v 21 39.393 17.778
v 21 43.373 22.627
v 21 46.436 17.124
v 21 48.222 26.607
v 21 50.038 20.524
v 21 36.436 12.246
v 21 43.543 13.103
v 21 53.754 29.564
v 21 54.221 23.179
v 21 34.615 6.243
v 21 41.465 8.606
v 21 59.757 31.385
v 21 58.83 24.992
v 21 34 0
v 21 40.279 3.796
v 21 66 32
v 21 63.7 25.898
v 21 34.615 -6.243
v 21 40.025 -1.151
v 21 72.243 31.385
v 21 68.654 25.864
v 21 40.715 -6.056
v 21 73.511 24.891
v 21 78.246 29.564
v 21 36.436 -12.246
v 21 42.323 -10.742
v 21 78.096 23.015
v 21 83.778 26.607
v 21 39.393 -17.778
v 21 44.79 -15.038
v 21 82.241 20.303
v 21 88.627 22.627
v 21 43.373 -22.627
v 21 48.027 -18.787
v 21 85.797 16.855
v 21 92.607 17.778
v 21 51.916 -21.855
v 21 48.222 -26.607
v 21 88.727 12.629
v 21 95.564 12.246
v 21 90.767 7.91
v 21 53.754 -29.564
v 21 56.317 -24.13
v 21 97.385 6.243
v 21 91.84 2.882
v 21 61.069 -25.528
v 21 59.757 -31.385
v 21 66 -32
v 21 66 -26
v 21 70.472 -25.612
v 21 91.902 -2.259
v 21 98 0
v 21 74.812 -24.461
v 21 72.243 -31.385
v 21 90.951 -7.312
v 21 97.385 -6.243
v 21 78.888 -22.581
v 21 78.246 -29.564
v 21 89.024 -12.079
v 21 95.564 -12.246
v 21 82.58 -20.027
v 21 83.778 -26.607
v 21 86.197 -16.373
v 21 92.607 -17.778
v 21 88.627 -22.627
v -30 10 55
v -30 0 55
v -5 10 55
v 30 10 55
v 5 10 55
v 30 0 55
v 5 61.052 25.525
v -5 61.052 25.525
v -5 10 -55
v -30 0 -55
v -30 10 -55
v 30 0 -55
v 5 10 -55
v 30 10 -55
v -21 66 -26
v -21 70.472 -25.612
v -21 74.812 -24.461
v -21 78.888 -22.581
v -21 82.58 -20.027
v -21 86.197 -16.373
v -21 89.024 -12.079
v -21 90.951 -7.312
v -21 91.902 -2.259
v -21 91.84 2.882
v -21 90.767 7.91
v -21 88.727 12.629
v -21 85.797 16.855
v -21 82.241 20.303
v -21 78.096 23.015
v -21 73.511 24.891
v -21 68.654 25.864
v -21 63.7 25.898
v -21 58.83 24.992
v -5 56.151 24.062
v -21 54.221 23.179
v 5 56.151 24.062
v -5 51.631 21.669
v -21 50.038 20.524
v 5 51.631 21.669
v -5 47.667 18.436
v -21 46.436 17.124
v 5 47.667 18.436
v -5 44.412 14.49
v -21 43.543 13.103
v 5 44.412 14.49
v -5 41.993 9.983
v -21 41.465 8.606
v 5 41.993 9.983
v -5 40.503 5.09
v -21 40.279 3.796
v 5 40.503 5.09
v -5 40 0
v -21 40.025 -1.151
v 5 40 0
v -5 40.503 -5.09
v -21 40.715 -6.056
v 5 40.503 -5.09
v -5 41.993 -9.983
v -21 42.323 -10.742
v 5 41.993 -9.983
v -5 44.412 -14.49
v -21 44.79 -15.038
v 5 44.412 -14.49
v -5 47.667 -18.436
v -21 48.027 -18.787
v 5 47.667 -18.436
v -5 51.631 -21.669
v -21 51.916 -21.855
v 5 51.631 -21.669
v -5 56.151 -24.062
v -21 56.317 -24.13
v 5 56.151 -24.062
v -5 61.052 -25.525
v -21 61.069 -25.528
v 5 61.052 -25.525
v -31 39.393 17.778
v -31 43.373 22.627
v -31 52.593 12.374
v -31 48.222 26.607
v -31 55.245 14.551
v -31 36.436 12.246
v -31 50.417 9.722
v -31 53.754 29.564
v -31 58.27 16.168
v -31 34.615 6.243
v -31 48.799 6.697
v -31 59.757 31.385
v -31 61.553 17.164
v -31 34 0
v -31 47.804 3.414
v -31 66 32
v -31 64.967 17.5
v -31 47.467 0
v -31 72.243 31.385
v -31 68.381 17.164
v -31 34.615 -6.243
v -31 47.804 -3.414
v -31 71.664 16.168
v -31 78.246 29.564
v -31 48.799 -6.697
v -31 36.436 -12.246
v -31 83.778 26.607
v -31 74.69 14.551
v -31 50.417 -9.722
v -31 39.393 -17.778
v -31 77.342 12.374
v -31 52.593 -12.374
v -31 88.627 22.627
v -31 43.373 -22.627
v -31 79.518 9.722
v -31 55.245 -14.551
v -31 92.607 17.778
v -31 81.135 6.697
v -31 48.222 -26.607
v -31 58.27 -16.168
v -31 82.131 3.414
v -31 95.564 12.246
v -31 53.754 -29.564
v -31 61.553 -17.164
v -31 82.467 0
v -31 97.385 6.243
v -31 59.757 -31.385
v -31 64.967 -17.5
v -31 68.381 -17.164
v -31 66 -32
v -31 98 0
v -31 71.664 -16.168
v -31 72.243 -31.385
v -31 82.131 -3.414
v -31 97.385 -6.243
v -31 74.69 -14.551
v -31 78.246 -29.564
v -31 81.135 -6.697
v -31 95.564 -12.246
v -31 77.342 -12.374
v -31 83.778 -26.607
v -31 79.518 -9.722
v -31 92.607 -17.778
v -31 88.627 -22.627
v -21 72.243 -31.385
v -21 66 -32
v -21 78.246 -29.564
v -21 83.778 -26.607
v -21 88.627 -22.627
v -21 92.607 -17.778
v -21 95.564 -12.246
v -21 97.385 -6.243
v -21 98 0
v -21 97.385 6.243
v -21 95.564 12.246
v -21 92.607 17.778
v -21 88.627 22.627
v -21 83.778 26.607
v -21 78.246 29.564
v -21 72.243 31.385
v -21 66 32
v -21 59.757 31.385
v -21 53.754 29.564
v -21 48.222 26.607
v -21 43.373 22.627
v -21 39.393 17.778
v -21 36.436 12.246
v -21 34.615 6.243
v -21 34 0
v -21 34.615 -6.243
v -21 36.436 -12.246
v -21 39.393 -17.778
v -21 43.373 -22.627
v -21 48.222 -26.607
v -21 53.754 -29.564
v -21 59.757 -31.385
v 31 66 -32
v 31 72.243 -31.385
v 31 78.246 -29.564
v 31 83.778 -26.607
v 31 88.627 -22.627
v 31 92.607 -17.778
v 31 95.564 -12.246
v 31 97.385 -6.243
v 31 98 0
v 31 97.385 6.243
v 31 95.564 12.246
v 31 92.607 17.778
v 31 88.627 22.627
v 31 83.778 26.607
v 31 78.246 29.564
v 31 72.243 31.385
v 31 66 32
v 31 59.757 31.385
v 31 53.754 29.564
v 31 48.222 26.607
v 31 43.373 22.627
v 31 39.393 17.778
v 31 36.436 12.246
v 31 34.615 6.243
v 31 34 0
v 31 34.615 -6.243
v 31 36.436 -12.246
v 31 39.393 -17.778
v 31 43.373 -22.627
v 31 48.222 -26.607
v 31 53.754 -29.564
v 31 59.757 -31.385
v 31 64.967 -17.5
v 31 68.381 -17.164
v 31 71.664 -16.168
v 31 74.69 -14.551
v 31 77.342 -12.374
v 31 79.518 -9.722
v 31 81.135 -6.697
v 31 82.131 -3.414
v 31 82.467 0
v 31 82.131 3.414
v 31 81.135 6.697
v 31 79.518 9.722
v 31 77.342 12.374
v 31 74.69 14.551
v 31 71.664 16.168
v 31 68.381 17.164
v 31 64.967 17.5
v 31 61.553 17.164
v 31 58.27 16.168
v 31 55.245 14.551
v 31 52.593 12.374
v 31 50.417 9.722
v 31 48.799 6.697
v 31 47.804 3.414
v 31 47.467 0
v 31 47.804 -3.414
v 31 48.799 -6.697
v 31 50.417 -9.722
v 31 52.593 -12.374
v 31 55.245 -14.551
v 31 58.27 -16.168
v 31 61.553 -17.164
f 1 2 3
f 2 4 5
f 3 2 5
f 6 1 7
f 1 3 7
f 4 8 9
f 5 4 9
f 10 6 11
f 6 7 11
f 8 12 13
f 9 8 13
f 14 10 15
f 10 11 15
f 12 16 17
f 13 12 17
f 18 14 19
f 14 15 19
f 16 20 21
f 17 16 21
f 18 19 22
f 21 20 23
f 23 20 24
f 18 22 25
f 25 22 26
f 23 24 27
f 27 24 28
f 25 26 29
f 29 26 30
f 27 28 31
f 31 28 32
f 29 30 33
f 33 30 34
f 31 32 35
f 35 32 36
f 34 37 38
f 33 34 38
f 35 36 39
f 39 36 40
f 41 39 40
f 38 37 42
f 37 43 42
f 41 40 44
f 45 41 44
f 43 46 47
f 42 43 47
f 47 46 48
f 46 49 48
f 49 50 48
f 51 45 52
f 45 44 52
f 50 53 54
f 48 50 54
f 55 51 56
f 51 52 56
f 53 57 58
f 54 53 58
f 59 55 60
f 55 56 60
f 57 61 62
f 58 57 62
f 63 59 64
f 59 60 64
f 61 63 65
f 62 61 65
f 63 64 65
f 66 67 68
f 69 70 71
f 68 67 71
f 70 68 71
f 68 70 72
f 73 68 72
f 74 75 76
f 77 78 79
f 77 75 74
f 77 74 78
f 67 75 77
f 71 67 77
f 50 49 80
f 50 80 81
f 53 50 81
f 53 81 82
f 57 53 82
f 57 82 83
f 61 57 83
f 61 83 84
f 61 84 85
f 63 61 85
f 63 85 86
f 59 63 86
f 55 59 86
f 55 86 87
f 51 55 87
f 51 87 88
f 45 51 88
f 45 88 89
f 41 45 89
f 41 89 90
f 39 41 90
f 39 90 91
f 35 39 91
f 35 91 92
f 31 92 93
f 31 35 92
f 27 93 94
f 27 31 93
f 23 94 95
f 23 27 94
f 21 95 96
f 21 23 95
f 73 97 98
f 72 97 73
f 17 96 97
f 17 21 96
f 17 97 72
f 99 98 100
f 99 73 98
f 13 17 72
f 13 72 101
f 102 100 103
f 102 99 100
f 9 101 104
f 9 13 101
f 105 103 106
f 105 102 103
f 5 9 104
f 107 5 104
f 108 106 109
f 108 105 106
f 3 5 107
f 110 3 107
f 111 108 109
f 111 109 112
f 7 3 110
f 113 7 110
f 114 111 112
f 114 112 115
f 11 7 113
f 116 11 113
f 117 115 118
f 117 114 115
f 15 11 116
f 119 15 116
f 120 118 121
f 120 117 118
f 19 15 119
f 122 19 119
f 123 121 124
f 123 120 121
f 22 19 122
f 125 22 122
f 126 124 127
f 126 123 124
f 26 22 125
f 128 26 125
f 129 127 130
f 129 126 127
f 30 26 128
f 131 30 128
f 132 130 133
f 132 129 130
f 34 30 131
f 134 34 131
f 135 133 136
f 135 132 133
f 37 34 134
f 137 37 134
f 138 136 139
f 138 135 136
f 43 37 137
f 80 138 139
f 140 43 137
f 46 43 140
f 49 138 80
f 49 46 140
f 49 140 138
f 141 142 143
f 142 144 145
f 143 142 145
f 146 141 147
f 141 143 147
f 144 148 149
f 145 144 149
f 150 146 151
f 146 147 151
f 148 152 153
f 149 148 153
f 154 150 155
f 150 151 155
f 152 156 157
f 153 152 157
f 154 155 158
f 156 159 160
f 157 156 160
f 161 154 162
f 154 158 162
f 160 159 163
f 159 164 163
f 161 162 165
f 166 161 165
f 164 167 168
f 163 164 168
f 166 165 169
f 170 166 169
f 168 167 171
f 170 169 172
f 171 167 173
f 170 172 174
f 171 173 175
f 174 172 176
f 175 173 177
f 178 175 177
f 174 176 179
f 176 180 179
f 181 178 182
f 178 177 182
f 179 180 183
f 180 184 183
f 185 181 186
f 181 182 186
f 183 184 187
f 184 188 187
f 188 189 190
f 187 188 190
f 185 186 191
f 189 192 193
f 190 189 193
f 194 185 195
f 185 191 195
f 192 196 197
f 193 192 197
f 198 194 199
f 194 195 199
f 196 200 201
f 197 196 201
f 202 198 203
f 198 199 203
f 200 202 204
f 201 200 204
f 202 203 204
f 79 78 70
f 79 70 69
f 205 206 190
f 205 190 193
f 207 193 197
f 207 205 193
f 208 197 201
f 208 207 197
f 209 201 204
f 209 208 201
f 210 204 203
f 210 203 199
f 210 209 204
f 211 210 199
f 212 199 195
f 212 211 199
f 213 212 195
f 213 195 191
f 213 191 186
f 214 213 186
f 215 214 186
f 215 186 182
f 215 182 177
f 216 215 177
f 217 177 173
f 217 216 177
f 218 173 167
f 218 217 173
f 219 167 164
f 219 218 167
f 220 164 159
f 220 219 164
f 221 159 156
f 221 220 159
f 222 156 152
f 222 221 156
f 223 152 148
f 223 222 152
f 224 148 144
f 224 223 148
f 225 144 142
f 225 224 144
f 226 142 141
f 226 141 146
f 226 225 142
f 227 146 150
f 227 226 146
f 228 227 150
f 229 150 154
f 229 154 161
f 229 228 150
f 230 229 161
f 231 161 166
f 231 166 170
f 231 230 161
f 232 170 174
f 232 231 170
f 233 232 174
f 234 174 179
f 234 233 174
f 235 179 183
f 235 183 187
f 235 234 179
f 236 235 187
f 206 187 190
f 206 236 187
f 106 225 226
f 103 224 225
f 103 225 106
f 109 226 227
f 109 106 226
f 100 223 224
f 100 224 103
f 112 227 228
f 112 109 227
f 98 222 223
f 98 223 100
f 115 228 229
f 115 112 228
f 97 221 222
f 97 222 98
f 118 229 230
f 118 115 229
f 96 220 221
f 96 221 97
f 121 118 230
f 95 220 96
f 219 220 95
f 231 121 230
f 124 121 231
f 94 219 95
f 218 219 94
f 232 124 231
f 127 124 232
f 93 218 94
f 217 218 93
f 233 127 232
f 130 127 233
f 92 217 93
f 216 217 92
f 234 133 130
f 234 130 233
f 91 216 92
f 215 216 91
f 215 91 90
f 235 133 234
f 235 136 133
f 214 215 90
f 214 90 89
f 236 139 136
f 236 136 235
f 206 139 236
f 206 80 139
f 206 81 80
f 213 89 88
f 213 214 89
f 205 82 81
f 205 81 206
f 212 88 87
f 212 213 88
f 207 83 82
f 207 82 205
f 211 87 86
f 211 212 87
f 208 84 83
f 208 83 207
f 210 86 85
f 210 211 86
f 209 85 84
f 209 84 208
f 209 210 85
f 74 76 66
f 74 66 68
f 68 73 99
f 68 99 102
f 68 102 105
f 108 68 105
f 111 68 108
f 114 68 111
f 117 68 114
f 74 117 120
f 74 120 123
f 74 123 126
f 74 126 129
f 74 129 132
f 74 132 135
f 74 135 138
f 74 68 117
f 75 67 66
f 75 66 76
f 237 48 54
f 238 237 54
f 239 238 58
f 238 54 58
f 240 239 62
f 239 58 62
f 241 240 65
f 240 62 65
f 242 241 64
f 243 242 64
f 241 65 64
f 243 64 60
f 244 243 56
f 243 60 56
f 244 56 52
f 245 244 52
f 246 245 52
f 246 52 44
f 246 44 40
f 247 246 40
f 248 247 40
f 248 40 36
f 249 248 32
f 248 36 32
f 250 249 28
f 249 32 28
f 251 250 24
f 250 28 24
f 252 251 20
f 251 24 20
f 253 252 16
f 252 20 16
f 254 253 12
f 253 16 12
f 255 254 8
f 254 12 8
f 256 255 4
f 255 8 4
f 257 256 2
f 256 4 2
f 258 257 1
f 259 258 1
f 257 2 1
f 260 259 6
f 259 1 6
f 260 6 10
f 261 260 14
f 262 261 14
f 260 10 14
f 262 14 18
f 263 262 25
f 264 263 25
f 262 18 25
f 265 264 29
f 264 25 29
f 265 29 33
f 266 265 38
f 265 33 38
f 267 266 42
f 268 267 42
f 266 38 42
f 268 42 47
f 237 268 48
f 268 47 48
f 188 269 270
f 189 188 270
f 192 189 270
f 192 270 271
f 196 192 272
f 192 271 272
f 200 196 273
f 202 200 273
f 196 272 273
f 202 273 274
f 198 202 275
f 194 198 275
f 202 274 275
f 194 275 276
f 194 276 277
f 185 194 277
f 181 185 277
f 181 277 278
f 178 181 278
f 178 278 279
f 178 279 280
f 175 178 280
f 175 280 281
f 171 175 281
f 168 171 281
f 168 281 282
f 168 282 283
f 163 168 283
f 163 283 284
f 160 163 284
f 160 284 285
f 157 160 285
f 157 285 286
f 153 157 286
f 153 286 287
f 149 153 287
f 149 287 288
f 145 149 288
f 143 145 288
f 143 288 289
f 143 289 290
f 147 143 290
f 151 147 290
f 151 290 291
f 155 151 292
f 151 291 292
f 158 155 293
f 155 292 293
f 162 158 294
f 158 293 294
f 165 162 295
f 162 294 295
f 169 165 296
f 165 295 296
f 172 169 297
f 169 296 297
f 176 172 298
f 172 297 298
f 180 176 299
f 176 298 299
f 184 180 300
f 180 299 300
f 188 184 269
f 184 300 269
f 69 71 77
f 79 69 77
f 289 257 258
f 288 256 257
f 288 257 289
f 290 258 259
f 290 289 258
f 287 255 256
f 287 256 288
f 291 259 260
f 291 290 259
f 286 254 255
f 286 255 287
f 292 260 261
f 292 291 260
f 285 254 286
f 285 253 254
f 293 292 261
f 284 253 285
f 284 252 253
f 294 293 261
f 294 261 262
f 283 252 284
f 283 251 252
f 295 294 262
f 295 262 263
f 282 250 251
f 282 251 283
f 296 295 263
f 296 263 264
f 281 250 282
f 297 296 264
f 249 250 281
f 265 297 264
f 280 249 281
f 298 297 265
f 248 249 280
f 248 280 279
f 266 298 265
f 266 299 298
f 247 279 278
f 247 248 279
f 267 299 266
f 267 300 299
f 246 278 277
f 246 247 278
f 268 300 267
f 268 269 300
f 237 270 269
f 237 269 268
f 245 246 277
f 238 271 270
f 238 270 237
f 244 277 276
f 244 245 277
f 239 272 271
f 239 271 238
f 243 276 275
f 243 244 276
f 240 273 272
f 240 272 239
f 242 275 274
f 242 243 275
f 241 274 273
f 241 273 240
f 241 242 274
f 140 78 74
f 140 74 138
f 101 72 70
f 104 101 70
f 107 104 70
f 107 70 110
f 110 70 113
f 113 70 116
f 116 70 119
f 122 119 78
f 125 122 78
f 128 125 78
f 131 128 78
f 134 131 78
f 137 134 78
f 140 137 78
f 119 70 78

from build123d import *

# Parameters (mm, degrees)
SKETCH_1_W          = 60
SKETCH_1_H          = 110
EXTRUDE_1_DEPTH     = 10
SKETCH_2_W          = 10
SKETCH_2_H          = 110
EXTRUDE_2_DEPTH     = 85
CUT_EXTRUDE_1_DEPTH = 85
SKETCH_4_R          = 26
EXTRUDE_3_DEPTH     = 21
CUT_EXTRUDE_2_DEPTH = 42
SKETCH_6_R          = 32
EXTRUDE_4_DEPTH     = 10
SKETCH_7_R          = 17.5
CUT_EXTRUDE_3_DEPTH = 81


with BuildPart() as part:
    # 스케치1 → 보스-돌출1 (new body)
    with BuildSketch(Plane(origin=(0, 0, 0), x_dir=(1, 0, 0), z_dir=(0, 1, 0))):
        Rectangle(SKETCH_1_W, SKETCH_1_H)
    extrude(amount=EXTRUDE_1_DEPTH)

    # 스케치2 → 보스-돌출2 (add)
    with BuildSketch(Plane(origin=(0, 10, 0), x_dir=(1, 0, 0), z_dir=(0, 1, 0))):
        Rectangle(SKETCH_2_W, SKETCH_2_H)
    extrude(amount=EXTRUDE_2_DEPTH)

    # 스케치3 → 컷-돌출1 (cut)
    with BuildSketch(Plane(origin=(5, 0, 0), x_dir=(0, 0, -1), z_dir=(1, 0, 0))):
        Polygon((-55, 10), (-1.927245104, 101.924707978), (-74.670847317, 101.924707978), (-74.670847317, 10), align=None)
    cut_extrude_1 = extrude(amount=-CUT_EXTRUDE_1_DEPTH, mode=Mode.SUBTRACT)

    # 대칭 복사1: 컷-돌출1 across plane
    add(cut_extrude_1.mirror(Plane.XY), mode=Mode.SUBTRACT)

    # 스케치4 → 보스-돌출3 (add, symmetric)
    with BuildSketch(Plane(origin=(0, 0, 0), x_dir=(0, 0, -1), z_dir=(1, 0, 0))):
        with Locations((0, 66)):
            Circle(SKETCH_4_R)
    extrude(amount=EXTRUDE_3_DEPTH, both=True)

    # 스케치5 → 컷-돌출2 (cut)
    with BuildSketch(Plane(origin=(21, 0, 0), x_dir=(0, 0, -1), z_dir=(1, 0, 0))):
        with BuildLine():
            Line((-16.854508663, 85.797109328), (-12.442891348, 105.747158049))
            Line((-12.442891348, 105.747158049), (16.049526521, 102.320854634))
            Line((16.049526521, 102.320854634), (20.027337967, 82.58028148))
            ThreePointArc((20.027337967, 82.58028148), (2.259138508, 91.901665838), (-16.854508663, 85.797109328))
        make_face()
    extrude(amount=-CUT_EXTRUDE_2_DEPTH, mode=Mode.SUBTRACT)

    # 스케치6 → 보스-돌출4 (add)
    with BuildSketch(Plane(origin=(21, 0, 0), x_dir=(0, 0, -1), z_dir=(1, 0, 0))):
        with Locations((0, 66)):
            Circle(SKETCH_6_R)
    extrude_4 = extrude(amount=EXTRUDE_4_DEPTH)

    # 대칭 복사2: 보스-돌출4 across plane
    add(extrude_4.mirror(Plane(origin=(0, 0, 0), x_dir=(0, 0, 1), z_dir=(1, 0, 0))))

    # 스케치7 → 컷-돌출3 (cut)
    with BuildSketch(Plane(origin=(31, 0, 0), x_dir=(0, 0, -1), z_dir=(1, 0, 0))):
        with Locations((0, 64.96726993)):
            Circle(SKETCH_7_R)
    extrude(amount=-CUT_EXTRUDE_3_DEPTH, mode=Mode.SUBTRACT)


solid = part.part
